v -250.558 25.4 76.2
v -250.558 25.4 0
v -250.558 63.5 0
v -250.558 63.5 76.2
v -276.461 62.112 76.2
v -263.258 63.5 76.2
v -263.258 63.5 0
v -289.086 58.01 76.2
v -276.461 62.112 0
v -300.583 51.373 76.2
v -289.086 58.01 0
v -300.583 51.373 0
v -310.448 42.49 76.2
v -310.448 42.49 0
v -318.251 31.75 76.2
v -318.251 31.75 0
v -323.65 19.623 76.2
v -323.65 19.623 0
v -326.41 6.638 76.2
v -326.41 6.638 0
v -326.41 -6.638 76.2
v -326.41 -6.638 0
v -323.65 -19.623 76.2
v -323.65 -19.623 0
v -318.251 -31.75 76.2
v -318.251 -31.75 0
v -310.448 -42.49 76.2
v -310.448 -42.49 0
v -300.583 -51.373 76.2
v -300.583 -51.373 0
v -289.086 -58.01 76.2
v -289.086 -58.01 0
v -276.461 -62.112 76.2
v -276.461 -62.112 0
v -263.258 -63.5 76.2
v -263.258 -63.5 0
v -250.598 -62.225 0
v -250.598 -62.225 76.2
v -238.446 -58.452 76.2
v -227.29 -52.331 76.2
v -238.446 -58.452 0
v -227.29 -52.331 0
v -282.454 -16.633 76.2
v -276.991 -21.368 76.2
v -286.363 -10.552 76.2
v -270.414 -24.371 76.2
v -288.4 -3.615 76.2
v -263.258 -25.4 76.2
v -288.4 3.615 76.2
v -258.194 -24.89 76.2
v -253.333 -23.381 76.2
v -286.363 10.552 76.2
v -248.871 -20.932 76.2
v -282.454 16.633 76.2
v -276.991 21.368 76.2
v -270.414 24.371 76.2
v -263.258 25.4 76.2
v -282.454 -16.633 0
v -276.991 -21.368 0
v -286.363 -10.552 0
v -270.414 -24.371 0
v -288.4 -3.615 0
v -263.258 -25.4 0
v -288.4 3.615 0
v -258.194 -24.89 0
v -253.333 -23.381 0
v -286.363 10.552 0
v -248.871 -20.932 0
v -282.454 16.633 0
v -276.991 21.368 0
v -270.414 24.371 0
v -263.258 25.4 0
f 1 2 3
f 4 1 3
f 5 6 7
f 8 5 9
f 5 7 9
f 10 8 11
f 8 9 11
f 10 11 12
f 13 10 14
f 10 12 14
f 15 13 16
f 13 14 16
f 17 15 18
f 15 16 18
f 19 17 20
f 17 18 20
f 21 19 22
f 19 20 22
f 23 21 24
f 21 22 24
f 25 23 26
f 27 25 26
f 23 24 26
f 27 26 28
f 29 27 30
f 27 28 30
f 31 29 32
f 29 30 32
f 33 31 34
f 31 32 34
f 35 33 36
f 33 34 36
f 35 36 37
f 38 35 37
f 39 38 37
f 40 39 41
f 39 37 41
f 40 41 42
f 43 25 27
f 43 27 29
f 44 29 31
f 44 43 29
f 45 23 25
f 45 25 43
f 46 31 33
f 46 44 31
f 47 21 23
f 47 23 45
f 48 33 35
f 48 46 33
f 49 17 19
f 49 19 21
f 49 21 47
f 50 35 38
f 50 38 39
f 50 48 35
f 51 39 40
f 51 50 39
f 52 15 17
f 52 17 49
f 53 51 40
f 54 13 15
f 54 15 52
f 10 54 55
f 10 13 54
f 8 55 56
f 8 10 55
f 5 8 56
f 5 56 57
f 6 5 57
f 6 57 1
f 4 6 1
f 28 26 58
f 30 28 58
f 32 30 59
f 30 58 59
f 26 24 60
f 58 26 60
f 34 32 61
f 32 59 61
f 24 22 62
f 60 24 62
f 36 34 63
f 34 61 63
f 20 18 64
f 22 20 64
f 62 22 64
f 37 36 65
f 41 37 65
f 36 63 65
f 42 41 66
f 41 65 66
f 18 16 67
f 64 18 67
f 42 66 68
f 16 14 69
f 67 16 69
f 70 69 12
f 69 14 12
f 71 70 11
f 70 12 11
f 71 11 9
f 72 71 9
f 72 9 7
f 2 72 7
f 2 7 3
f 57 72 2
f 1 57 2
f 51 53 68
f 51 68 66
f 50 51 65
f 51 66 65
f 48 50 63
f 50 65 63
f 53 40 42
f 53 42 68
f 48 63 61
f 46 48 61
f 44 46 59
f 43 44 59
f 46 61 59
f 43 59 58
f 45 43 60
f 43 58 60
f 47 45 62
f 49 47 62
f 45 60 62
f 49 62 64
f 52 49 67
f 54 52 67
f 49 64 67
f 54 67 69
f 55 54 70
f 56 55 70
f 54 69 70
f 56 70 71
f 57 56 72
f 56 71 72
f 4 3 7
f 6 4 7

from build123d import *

# Parameters (mm, degrees)
BOSS_EXTRUDE1_DEPTH = 76.2


with BuildPart() as part:
    # Sketch1 → Boss-Extrude1 (new body)
    with BuildSketch(Plane.XY):
        with BuildLine():
            ThreePointArc((-263.258240929, -25.4), (-288.658240929, 0), (-263.258240929, 25.4))
            Line((-263.258240929, 25.4), (-250.558240929, 25.4))
            Line((-250.558240929, 25.4), (-250.558240929, 63.5))
            Line((-250.558240929, 63.5), (-263.217595671, 63.5))
            Line((-263.217595671, 63.5), (-263.258240929, 63.5))
            ThreePointArc((-263.258240929, 63.5), (-326.758240929, 0), (-263.258240929, -63.5))
            ThreePointArc((-263.258240929, -63.5), (-244.427108864, -60.643536054), (-227.290164194, -52.33113276))
            Line((-227.290164194, -52.33113276), (-248.871010235, -20.932453104))
            ThreePointArc((-248.871010235, -20.932453104), (-255.725788103, -24.257414422), (-263.258240929, -25.4))
        make_face()
    extrude(amount=BOSS_EXTRUDE1_DEPTH)


solid = part.part
